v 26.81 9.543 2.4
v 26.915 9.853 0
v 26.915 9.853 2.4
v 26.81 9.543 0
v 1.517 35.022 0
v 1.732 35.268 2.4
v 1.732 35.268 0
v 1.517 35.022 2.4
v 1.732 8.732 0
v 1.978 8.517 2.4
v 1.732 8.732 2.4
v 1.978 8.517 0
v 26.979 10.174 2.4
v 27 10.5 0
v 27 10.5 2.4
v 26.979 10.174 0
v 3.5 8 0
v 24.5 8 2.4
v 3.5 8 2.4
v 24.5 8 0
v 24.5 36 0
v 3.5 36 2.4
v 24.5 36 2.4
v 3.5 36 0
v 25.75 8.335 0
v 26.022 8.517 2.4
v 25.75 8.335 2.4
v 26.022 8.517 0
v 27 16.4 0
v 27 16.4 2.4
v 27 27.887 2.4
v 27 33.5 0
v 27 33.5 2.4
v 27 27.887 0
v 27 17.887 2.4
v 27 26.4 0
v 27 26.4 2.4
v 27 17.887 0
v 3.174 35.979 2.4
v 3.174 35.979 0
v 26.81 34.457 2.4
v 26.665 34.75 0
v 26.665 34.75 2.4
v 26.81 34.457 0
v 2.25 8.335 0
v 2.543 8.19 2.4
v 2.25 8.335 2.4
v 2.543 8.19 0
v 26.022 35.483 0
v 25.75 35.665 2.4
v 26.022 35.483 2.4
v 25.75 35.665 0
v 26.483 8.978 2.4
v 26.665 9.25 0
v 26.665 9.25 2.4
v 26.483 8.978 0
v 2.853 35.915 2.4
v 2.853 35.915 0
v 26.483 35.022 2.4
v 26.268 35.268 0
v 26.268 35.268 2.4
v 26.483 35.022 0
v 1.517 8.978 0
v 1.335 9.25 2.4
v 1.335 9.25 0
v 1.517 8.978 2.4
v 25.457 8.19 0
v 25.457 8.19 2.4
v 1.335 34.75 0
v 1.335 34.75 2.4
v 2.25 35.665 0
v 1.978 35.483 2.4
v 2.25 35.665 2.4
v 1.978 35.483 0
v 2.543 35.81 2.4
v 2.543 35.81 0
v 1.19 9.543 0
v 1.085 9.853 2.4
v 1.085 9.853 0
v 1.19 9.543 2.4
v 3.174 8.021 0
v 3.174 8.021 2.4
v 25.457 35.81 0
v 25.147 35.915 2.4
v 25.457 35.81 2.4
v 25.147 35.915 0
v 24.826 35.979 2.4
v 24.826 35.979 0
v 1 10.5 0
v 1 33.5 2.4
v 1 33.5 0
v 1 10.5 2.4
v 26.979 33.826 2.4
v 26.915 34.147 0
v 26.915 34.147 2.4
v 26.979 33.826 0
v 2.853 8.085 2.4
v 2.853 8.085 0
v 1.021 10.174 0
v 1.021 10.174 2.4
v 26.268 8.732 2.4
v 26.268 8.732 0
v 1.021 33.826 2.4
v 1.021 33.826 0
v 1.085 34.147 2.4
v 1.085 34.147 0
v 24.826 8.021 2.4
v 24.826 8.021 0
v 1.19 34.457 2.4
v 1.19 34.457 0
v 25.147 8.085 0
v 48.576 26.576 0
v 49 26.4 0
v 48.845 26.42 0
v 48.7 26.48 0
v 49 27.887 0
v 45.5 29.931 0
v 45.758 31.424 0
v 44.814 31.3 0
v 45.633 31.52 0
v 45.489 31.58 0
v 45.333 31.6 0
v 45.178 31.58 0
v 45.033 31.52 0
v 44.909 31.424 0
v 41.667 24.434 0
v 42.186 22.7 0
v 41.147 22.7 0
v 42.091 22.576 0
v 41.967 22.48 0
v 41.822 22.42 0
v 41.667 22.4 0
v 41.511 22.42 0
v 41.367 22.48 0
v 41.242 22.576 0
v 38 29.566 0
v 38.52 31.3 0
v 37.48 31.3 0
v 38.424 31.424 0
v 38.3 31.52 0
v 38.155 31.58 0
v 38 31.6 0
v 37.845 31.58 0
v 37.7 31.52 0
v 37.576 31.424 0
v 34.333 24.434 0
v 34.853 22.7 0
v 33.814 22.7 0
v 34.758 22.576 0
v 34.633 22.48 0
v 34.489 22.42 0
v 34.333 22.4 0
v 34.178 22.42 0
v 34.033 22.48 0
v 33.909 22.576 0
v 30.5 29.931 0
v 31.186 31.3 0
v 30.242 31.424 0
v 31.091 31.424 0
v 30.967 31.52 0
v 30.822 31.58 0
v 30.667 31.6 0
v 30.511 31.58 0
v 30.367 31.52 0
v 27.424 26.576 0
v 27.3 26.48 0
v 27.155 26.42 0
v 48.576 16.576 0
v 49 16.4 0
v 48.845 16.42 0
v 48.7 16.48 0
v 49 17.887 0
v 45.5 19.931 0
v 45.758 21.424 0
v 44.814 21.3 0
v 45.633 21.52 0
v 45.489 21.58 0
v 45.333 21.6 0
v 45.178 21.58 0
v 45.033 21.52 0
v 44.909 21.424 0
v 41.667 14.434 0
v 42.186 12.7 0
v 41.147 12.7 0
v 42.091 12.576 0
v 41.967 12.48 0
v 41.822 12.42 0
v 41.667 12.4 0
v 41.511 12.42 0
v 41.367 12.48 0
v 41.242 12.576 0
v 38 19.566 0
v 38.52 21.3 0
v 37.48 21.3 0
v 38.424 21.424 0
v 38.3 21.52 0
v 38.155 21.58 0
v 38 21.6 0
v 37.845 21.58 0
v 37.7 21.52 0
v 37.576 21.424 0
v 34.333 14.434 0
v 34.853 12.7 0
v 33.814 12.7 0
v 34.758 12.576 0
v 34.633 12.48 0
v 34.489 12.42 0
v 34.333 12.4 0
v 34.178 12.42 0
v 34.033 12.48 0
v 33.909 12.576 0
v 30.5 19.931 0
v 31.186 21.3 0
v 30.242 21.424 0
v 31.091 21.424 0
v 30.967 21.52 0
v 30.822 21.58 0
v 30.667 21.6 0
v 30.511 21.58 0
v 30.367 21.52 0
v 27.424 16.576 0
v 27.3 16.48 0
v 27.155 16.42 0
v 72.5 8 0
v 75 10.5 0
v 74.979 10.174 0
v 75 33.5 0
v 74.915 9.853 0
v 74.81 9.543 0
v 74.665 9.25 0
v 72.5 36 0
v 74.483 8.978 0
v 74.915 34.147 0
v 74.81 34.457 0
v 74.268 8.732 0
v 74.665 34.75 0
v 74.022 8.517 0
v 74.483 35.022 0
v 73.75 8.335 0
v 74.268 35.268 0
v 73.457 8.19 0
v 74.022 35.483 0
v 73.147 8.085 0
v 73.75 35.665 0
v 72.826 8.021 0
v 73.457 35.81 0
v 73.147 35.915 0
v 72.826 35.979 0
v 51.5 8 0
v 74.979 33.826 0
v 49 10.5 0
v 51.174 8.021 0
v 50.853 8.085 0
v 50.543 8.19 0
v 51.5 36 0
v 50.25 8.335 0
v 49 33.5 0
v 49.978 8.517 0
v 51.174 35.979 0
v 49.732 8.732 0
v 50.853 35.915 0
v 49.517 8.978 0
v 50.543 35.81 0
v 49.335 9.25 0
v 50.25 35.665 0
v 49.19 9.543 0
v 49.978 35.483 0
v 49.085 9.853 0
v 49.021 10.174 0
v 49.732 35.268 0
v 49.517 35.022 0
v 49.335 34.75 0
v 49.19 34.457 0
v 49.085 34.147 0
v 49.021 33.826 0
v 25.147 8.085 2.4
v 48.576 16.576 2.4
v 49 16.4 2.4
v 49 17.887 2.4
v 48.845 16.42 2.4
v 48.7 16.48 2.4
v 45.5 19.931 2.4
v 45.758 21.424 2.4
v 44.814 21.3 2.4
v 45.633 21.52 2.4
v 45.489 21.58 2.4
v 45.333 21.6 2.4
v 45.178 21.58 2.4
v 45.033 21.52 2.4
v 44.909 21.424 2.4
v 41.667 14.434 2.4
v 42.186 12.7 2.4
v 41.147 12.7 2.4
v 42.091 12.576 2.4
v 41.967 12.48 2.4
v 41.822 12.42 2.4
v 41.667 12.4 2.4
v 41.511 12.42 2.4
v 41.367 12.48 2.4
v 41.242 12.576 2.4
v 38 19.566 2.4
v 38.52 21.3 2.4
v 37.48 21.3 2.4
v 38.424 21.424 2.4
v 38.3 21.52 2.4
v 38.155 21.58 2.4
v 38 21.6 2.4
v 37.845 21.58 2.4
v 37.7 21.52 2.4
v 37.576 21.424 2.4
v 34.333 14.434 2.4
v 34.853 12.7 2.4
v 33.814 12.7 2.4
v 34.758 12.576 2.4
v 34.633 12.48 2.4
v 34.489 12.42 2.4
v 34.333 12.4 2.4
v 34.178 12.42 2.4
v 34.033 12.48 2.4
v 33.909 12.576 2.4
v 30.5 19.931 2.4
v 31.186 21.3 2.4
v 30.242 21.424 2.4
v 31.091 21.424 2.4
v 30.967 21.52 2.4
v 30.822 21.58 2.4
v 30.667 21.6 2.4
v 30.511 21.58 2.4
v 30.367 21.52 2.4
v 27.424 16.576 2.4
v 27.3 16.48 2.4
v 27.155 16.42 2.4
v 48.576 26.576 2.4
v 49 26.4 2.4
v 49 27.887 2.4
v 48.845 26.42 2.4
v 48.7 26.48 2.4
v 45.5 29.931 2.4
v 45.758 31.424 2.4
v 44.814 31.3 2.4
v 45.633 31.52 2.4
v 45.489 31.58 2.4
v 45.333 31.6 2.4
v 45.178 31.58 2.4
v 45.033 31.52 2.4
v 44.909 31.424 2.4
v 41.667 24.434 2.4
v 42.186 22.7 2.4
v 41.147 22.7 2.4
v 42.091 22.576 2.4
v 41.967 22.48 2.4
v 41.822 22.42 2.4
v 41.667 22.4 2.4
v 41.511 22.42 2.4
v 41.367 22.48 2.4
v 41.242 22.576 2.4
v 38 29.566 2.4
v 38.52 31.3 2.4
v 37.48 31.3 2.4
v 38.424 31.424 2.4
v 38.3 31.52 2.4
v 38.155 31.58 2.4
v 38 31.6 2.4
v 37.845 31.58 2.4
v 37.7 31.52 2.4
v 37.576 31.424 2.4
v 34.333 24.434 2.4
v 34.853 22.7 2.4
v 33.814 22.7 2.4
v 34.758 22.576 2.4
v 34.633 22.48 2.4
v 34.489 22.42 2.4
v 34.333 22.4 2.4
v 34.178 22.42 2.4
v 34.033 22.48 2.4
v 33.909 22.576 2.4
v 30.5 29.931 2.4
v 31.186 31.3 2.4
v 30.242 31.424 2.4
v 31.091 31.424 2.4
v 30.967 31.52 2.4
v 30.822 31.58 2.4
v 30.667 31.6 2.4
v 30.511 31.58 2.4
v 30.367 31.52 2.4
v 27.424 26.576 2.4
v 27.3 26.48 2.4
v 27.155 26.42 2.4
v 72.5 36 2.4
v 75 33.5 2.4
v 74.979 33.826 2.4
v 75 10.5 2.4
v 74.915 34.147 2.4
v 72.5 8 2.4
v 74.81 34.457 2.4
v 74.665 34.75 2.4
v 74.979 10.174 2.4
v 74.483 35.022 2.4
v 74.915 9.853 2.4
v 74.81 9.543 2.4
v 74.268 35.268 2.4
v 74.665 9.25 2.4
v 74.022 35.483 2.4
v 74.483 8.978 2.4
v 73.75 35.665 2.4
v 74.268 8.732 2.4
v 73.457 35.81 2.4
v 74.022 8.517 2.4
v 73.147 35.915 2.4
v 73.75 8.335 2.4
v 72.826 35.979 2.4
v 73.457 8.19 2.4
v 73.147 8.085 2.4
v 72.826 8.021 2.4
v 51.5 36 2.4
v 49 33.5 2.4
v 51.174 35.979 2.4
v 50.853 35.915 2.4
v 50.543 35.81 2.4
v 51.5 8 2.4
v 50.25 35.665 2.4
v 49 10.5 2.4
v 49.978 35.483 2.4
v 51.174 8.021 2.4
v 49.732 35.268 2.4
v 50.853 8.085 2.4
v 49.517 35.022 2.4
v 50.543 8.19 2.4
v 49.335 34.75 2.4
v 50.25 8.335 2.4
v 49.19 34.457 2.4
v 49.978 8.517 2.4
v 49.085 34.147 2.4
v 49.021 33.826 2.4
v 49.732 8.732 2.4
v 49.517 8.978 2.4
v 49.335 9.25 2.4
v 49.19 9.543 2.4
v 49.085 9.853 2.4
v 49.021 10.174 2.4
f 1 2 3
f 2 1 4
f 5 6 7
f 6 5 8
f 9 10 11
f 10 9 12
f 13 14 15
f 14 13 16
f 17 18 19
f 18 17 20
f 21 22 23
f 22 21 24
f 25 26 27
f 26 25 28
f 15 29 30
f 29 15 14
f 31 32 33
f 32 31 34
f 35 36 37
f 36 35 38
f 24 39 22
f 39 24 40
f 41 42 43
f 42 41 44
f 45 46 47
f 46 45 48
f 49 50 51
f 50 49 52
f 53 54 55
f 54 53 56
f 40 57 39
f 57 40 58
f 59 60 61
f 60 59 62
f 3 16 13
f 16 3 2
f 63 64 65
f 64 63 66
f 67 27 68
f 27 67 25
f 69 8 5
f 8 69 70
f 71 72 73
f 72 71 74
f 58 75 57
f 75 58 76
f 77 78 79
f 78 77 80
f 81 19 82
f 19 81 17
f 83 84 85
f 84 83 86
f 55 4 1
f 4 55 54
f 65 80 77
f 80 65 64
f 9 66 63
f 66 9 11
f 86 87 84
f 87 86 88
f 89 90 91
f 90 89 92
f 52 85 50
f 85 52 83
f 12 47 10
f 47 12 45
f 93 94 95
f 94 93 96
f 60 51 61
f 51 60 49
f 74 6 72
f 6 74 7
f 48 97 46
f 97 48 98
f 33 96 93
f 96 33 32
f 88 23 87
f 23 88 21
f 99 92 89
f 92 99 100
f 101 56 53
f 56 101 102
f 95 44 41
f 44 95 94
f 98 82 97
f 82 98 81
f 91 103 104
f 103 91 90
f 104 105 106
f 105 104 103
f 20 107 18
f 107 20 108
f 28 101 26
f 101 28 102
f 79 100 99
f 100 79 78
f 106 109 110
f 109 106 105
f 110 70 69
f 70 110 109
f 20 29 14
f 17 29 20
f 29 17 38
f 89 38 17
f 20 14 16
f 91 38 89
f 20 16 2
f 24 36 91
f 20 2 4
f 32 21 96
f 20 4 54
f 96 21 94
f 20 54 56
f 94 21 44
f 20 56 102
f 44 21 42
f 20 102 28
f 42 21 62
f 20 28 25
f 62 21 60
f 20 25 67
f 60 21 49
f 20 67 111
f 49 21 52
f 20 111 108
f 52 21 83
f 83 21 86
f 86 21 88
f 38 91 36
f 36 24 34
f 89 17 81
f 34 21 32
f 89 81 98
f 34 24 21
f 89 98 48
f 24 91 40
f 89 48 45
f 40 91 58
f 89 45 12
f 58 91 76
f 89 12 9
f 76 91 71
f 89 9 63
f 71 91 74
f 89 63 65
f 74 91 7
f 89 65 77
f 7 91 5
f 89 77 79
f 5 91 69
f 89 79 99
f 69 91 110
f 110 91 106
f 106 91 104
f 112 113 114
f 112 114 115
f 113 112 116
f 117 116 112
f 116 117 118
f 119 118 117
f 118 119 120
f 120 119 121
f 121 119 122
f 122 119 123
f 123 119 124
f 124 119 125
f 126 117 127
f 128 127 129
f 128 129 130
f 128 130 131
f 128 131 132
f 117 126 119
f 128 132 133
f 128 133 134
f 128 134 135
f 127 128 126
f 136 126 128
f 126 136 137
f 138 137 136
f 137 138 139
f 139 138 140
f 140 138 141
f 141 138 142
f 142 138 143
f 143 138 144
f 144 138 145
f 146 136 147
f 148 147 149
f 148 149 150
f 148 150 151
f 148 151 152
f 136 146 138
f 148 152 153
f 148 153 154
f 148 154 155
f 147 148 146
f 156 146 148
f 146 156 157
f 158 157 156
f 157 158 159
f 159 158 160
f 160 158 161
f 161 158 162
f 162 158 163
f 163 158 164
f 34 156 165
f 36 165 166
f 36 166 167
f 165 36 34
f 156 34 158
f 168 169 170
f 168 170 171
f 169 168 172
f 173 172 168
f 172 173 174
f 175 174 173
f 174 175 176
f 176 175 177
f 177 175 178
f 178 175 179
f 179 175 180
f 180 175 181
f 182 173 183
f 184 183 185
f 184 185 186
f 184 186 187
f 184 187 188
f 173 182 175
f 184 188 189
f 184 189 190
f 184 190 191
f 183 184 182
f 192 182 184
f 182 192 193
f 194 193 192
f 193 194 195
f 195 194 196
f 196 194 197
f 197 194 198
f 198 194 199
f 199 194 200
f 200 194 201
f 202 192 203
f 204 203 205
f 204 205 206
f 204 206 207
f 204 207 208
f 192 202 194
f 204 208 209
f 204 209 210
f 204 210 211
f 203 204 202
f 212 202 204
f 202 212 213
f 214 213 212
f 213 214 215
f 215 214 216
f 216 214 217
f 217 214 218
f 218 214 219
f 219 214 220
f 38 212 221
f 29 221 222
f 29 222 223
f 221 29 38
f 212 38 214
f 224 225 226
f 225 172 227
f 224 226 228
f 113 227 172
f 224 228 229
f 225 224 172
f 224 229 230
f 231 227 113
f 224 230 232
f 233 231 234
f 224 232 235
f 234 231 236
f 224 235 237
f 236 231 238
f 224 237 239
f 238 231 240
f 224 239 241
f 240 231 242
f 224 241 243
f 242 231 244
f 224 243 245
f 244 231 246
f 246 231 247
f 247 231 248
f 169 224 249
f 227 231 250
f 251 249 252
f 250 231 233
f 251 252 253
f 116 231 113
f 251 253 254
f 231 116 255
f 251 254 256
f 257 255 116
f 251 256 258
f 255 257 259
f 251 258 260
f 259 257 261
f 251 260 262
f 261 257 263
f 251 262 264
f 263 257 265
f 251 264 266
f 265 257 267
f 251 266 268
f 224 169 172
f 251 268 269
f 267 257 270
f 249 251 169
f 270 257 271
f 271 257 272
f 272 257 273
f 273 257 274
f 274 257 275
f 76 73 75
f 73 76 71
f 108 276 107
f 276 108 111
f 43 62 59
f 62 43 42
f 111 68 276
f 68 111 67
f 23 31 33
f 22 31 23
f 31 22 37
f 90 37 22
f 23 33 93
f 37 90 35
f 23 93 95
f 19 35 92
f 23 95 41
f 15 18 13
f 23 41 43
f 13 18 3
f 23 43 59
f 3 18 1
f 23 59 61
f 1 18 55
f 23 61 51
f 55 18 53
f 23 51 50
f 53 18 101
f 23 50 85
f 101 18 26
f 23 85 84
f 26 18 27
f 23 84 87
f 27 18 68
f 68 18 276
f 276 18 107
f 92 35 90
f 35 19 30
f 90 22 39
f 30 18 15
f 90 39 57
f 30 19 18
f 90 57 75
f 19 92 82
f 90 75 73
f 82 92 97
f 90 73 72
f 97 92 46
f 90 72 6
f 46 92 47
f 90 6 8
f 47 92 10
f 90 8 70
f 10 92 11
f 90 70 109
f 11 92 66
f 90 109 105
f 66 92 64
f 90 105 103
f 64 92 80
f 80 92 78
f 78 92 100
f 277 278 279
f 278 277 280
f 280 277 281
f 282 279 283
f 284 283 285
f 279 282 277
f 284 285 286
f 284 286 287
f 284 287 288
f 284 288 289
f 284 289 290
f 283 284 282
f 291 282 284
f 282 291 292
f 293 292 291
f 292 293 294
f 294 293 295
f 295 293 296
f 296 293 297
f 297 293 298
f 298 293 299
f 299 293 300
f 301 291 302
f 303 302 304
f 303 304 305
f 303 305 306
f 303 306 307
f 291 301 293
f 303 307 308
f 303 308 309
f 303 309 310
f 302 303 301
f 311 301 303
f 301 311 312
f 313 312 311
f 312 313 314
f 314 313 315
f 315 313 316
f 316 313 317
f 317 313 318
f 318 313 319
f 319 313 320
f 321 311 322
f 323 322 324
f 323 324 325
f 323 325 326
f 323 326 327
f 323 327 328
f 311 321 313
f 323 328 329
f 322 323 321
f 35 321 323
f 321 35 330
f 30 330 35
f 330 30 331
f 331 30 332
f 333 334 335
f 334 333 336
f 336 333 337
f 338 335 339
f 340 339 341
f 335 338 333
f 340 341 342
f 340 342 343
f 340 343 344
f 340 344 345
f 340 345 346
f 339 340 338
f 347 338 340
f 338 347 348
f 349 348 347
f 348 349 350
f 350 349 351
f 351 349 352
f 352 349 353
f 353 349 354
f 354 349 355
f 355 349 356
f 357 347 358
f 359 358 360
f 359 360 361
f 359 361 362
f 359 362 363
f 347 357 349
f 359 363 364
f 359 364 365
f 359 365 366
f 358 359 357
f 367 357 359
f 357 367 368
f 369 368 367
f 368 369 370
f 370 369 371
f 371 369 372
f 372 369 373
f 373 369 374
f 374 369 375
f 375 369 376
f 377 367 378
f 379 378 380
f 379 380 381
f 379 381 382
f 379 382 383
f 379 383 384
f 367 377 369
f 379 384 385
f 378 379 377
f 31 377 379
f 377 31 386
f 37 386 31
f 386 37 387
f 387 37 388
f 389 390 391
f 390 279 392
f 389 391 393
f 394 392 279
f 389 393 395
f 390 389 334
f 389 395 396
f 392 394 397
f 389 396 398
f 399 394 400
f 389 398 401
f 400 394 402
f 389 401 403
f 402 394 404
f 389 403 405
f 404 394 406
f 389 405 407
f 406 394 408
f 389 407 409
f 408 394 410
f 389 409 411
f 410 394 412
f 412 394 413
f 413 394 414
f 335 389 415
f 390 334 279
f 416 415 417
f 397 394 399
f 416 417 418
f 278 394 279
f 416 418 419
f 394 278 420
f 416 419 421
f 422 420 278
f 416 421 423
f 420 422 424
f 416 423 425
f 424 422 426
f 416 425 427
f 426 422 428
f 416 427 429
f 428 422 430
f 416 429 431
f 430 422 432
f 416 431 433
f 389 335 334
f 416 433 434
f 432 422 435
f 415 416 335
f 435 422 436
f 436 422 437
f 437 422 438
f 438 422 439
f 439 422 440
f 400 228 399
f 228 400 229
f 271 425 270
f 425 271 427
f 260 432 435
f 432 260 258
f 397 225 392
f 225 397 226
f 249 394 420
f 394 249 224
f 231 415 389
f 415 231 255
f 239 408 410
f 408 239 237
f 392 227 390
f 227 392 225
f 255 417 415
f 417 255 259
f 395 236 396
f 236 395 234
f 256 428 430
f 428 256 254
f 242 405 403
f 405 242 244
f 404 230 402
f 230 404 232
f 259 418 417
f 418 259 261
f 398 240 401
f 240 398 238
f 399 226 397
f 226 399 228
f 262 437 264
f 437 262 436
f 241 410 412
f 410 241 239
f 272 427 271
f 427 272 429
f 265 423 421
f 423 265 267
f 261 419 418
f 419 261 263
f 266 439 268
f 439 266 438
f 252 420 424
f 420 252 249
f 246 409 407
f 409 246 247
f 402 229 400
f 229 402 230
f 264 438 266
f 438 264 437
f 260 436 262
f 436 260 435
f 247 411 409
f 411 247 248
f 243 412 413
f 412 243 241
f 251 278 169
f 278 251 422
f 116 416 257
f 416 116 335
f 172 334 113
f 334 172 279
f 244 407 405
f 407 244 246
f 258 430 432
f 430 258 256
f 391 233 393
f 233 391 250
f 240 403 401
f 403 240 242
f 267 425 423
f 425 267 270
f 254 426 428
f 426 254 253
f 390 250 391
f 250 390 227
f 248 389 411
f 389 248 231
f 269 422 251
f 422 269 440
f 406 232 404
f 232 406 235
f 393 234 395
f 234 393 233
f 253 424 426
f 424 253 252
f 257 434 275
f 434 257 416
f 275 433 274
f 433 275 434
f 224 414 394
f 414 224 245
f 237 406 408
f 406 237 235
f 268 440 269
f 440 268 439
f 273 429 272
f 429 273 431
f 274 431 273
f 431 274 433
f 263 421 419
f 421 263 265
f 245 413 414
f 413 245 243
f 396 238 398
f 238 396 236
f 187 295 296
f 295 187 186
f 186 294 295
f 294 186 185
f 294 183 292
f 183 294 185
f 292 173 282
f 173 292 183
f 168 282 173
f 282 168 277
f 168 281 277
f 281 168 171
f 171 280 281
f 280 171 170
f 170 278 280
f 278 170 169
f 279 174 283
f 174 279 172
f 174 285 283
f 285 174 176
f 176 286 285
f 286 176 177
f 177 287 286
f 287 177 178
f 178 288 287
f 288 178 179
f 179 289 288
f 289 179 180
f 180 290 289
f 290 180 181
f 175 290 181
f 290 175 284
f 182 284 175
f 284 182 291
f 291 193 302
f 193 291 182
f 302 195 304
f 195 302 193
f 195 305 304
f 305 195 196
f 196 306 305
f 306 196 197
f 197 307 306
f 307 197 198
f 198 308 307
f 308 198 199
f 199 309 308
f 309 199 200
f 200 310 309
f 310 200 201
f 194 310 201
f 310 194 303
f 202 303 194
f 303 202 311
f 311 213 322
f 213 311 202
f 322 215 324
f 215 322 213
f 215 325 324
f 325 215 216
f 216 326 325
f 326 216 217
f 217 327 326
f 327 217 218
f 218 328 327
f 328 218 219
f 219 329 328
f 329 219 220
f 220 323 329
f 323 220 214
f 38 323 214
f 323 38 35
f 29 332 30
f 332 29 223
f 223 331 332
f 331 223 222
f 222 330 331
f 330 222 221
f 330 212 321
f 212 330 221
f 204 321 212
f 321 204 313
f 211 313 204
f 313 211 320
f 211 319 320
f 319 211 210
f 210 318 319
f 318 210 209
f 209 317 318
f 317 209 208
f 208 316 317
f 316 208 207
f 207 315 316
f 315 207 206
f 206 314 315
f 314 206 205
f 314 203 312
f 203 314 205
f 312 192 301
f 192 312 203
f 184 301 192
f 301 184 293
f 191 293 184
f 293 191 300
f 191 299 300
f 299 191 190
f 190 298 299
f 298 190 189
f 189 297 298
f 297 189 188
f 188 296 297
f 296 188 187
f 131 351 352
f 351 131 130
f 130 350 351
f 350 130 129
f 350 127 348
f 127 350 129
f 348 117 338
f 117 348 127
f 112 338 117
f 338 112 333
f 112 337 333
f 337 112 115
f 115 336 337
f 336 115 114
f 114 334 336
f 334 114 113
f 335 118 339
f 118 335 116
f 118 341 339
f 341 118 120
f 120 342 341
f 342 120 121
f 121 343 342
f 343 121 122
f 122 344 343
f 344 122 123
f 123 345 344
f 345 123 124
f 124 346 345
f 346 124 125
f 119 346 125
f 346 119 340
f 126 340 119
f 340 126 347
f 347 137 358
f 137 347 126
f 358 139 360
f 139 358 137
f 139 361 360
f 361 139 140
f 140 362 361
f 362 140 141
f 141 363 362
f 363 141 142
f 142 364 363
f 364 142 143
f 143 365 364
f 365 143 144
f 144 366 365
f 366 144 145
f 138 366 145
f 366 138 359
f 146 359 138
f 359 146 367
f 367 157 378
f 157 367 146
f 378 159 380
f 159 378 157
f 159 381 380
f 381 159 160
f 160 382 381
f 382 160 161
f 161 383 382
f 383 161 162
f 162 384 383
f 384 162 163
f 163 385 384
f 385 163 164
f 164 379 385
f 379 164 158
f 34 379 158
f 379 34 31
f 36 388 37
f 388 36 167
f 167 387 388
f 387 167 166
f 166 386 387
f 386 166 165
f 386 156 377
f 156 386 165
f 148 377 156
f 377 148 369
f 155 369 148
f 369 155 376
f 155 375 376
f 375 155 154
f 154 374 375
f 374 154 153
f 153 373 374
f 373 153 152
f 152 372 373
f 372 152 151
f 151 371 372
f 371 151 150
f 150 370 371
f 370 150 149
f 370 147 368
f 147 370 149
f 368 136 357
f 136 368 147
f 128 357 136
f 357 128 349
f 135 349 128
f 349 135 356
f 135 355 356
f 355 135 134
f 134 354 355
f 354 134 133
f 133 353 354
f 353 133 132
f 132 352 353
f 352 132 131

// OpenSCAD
/*
Sample 015: Serpentinen-Filmgelenk — 1,2 mm Bahn
Generated from the FDM Mechanical Sample Library.
Units: millimetres.

Override examples:
  openscad -o custom.stl -D 'view="plate"' -D 'render_fn=64' model.scad
  openscad -o preview.png -D 'view="assembly"' model.scad
*/
use <../../../library/fdm_mechanisms.scad>

render_fn = is_undef(render_fn) ? 48 : render_fn;
view = is_undef(view) ? "plate" : view;
$fn = render_fn;

sample_serpentine_hinge(
    view=view,
    beam_w=1.2,
    gap=22
);
